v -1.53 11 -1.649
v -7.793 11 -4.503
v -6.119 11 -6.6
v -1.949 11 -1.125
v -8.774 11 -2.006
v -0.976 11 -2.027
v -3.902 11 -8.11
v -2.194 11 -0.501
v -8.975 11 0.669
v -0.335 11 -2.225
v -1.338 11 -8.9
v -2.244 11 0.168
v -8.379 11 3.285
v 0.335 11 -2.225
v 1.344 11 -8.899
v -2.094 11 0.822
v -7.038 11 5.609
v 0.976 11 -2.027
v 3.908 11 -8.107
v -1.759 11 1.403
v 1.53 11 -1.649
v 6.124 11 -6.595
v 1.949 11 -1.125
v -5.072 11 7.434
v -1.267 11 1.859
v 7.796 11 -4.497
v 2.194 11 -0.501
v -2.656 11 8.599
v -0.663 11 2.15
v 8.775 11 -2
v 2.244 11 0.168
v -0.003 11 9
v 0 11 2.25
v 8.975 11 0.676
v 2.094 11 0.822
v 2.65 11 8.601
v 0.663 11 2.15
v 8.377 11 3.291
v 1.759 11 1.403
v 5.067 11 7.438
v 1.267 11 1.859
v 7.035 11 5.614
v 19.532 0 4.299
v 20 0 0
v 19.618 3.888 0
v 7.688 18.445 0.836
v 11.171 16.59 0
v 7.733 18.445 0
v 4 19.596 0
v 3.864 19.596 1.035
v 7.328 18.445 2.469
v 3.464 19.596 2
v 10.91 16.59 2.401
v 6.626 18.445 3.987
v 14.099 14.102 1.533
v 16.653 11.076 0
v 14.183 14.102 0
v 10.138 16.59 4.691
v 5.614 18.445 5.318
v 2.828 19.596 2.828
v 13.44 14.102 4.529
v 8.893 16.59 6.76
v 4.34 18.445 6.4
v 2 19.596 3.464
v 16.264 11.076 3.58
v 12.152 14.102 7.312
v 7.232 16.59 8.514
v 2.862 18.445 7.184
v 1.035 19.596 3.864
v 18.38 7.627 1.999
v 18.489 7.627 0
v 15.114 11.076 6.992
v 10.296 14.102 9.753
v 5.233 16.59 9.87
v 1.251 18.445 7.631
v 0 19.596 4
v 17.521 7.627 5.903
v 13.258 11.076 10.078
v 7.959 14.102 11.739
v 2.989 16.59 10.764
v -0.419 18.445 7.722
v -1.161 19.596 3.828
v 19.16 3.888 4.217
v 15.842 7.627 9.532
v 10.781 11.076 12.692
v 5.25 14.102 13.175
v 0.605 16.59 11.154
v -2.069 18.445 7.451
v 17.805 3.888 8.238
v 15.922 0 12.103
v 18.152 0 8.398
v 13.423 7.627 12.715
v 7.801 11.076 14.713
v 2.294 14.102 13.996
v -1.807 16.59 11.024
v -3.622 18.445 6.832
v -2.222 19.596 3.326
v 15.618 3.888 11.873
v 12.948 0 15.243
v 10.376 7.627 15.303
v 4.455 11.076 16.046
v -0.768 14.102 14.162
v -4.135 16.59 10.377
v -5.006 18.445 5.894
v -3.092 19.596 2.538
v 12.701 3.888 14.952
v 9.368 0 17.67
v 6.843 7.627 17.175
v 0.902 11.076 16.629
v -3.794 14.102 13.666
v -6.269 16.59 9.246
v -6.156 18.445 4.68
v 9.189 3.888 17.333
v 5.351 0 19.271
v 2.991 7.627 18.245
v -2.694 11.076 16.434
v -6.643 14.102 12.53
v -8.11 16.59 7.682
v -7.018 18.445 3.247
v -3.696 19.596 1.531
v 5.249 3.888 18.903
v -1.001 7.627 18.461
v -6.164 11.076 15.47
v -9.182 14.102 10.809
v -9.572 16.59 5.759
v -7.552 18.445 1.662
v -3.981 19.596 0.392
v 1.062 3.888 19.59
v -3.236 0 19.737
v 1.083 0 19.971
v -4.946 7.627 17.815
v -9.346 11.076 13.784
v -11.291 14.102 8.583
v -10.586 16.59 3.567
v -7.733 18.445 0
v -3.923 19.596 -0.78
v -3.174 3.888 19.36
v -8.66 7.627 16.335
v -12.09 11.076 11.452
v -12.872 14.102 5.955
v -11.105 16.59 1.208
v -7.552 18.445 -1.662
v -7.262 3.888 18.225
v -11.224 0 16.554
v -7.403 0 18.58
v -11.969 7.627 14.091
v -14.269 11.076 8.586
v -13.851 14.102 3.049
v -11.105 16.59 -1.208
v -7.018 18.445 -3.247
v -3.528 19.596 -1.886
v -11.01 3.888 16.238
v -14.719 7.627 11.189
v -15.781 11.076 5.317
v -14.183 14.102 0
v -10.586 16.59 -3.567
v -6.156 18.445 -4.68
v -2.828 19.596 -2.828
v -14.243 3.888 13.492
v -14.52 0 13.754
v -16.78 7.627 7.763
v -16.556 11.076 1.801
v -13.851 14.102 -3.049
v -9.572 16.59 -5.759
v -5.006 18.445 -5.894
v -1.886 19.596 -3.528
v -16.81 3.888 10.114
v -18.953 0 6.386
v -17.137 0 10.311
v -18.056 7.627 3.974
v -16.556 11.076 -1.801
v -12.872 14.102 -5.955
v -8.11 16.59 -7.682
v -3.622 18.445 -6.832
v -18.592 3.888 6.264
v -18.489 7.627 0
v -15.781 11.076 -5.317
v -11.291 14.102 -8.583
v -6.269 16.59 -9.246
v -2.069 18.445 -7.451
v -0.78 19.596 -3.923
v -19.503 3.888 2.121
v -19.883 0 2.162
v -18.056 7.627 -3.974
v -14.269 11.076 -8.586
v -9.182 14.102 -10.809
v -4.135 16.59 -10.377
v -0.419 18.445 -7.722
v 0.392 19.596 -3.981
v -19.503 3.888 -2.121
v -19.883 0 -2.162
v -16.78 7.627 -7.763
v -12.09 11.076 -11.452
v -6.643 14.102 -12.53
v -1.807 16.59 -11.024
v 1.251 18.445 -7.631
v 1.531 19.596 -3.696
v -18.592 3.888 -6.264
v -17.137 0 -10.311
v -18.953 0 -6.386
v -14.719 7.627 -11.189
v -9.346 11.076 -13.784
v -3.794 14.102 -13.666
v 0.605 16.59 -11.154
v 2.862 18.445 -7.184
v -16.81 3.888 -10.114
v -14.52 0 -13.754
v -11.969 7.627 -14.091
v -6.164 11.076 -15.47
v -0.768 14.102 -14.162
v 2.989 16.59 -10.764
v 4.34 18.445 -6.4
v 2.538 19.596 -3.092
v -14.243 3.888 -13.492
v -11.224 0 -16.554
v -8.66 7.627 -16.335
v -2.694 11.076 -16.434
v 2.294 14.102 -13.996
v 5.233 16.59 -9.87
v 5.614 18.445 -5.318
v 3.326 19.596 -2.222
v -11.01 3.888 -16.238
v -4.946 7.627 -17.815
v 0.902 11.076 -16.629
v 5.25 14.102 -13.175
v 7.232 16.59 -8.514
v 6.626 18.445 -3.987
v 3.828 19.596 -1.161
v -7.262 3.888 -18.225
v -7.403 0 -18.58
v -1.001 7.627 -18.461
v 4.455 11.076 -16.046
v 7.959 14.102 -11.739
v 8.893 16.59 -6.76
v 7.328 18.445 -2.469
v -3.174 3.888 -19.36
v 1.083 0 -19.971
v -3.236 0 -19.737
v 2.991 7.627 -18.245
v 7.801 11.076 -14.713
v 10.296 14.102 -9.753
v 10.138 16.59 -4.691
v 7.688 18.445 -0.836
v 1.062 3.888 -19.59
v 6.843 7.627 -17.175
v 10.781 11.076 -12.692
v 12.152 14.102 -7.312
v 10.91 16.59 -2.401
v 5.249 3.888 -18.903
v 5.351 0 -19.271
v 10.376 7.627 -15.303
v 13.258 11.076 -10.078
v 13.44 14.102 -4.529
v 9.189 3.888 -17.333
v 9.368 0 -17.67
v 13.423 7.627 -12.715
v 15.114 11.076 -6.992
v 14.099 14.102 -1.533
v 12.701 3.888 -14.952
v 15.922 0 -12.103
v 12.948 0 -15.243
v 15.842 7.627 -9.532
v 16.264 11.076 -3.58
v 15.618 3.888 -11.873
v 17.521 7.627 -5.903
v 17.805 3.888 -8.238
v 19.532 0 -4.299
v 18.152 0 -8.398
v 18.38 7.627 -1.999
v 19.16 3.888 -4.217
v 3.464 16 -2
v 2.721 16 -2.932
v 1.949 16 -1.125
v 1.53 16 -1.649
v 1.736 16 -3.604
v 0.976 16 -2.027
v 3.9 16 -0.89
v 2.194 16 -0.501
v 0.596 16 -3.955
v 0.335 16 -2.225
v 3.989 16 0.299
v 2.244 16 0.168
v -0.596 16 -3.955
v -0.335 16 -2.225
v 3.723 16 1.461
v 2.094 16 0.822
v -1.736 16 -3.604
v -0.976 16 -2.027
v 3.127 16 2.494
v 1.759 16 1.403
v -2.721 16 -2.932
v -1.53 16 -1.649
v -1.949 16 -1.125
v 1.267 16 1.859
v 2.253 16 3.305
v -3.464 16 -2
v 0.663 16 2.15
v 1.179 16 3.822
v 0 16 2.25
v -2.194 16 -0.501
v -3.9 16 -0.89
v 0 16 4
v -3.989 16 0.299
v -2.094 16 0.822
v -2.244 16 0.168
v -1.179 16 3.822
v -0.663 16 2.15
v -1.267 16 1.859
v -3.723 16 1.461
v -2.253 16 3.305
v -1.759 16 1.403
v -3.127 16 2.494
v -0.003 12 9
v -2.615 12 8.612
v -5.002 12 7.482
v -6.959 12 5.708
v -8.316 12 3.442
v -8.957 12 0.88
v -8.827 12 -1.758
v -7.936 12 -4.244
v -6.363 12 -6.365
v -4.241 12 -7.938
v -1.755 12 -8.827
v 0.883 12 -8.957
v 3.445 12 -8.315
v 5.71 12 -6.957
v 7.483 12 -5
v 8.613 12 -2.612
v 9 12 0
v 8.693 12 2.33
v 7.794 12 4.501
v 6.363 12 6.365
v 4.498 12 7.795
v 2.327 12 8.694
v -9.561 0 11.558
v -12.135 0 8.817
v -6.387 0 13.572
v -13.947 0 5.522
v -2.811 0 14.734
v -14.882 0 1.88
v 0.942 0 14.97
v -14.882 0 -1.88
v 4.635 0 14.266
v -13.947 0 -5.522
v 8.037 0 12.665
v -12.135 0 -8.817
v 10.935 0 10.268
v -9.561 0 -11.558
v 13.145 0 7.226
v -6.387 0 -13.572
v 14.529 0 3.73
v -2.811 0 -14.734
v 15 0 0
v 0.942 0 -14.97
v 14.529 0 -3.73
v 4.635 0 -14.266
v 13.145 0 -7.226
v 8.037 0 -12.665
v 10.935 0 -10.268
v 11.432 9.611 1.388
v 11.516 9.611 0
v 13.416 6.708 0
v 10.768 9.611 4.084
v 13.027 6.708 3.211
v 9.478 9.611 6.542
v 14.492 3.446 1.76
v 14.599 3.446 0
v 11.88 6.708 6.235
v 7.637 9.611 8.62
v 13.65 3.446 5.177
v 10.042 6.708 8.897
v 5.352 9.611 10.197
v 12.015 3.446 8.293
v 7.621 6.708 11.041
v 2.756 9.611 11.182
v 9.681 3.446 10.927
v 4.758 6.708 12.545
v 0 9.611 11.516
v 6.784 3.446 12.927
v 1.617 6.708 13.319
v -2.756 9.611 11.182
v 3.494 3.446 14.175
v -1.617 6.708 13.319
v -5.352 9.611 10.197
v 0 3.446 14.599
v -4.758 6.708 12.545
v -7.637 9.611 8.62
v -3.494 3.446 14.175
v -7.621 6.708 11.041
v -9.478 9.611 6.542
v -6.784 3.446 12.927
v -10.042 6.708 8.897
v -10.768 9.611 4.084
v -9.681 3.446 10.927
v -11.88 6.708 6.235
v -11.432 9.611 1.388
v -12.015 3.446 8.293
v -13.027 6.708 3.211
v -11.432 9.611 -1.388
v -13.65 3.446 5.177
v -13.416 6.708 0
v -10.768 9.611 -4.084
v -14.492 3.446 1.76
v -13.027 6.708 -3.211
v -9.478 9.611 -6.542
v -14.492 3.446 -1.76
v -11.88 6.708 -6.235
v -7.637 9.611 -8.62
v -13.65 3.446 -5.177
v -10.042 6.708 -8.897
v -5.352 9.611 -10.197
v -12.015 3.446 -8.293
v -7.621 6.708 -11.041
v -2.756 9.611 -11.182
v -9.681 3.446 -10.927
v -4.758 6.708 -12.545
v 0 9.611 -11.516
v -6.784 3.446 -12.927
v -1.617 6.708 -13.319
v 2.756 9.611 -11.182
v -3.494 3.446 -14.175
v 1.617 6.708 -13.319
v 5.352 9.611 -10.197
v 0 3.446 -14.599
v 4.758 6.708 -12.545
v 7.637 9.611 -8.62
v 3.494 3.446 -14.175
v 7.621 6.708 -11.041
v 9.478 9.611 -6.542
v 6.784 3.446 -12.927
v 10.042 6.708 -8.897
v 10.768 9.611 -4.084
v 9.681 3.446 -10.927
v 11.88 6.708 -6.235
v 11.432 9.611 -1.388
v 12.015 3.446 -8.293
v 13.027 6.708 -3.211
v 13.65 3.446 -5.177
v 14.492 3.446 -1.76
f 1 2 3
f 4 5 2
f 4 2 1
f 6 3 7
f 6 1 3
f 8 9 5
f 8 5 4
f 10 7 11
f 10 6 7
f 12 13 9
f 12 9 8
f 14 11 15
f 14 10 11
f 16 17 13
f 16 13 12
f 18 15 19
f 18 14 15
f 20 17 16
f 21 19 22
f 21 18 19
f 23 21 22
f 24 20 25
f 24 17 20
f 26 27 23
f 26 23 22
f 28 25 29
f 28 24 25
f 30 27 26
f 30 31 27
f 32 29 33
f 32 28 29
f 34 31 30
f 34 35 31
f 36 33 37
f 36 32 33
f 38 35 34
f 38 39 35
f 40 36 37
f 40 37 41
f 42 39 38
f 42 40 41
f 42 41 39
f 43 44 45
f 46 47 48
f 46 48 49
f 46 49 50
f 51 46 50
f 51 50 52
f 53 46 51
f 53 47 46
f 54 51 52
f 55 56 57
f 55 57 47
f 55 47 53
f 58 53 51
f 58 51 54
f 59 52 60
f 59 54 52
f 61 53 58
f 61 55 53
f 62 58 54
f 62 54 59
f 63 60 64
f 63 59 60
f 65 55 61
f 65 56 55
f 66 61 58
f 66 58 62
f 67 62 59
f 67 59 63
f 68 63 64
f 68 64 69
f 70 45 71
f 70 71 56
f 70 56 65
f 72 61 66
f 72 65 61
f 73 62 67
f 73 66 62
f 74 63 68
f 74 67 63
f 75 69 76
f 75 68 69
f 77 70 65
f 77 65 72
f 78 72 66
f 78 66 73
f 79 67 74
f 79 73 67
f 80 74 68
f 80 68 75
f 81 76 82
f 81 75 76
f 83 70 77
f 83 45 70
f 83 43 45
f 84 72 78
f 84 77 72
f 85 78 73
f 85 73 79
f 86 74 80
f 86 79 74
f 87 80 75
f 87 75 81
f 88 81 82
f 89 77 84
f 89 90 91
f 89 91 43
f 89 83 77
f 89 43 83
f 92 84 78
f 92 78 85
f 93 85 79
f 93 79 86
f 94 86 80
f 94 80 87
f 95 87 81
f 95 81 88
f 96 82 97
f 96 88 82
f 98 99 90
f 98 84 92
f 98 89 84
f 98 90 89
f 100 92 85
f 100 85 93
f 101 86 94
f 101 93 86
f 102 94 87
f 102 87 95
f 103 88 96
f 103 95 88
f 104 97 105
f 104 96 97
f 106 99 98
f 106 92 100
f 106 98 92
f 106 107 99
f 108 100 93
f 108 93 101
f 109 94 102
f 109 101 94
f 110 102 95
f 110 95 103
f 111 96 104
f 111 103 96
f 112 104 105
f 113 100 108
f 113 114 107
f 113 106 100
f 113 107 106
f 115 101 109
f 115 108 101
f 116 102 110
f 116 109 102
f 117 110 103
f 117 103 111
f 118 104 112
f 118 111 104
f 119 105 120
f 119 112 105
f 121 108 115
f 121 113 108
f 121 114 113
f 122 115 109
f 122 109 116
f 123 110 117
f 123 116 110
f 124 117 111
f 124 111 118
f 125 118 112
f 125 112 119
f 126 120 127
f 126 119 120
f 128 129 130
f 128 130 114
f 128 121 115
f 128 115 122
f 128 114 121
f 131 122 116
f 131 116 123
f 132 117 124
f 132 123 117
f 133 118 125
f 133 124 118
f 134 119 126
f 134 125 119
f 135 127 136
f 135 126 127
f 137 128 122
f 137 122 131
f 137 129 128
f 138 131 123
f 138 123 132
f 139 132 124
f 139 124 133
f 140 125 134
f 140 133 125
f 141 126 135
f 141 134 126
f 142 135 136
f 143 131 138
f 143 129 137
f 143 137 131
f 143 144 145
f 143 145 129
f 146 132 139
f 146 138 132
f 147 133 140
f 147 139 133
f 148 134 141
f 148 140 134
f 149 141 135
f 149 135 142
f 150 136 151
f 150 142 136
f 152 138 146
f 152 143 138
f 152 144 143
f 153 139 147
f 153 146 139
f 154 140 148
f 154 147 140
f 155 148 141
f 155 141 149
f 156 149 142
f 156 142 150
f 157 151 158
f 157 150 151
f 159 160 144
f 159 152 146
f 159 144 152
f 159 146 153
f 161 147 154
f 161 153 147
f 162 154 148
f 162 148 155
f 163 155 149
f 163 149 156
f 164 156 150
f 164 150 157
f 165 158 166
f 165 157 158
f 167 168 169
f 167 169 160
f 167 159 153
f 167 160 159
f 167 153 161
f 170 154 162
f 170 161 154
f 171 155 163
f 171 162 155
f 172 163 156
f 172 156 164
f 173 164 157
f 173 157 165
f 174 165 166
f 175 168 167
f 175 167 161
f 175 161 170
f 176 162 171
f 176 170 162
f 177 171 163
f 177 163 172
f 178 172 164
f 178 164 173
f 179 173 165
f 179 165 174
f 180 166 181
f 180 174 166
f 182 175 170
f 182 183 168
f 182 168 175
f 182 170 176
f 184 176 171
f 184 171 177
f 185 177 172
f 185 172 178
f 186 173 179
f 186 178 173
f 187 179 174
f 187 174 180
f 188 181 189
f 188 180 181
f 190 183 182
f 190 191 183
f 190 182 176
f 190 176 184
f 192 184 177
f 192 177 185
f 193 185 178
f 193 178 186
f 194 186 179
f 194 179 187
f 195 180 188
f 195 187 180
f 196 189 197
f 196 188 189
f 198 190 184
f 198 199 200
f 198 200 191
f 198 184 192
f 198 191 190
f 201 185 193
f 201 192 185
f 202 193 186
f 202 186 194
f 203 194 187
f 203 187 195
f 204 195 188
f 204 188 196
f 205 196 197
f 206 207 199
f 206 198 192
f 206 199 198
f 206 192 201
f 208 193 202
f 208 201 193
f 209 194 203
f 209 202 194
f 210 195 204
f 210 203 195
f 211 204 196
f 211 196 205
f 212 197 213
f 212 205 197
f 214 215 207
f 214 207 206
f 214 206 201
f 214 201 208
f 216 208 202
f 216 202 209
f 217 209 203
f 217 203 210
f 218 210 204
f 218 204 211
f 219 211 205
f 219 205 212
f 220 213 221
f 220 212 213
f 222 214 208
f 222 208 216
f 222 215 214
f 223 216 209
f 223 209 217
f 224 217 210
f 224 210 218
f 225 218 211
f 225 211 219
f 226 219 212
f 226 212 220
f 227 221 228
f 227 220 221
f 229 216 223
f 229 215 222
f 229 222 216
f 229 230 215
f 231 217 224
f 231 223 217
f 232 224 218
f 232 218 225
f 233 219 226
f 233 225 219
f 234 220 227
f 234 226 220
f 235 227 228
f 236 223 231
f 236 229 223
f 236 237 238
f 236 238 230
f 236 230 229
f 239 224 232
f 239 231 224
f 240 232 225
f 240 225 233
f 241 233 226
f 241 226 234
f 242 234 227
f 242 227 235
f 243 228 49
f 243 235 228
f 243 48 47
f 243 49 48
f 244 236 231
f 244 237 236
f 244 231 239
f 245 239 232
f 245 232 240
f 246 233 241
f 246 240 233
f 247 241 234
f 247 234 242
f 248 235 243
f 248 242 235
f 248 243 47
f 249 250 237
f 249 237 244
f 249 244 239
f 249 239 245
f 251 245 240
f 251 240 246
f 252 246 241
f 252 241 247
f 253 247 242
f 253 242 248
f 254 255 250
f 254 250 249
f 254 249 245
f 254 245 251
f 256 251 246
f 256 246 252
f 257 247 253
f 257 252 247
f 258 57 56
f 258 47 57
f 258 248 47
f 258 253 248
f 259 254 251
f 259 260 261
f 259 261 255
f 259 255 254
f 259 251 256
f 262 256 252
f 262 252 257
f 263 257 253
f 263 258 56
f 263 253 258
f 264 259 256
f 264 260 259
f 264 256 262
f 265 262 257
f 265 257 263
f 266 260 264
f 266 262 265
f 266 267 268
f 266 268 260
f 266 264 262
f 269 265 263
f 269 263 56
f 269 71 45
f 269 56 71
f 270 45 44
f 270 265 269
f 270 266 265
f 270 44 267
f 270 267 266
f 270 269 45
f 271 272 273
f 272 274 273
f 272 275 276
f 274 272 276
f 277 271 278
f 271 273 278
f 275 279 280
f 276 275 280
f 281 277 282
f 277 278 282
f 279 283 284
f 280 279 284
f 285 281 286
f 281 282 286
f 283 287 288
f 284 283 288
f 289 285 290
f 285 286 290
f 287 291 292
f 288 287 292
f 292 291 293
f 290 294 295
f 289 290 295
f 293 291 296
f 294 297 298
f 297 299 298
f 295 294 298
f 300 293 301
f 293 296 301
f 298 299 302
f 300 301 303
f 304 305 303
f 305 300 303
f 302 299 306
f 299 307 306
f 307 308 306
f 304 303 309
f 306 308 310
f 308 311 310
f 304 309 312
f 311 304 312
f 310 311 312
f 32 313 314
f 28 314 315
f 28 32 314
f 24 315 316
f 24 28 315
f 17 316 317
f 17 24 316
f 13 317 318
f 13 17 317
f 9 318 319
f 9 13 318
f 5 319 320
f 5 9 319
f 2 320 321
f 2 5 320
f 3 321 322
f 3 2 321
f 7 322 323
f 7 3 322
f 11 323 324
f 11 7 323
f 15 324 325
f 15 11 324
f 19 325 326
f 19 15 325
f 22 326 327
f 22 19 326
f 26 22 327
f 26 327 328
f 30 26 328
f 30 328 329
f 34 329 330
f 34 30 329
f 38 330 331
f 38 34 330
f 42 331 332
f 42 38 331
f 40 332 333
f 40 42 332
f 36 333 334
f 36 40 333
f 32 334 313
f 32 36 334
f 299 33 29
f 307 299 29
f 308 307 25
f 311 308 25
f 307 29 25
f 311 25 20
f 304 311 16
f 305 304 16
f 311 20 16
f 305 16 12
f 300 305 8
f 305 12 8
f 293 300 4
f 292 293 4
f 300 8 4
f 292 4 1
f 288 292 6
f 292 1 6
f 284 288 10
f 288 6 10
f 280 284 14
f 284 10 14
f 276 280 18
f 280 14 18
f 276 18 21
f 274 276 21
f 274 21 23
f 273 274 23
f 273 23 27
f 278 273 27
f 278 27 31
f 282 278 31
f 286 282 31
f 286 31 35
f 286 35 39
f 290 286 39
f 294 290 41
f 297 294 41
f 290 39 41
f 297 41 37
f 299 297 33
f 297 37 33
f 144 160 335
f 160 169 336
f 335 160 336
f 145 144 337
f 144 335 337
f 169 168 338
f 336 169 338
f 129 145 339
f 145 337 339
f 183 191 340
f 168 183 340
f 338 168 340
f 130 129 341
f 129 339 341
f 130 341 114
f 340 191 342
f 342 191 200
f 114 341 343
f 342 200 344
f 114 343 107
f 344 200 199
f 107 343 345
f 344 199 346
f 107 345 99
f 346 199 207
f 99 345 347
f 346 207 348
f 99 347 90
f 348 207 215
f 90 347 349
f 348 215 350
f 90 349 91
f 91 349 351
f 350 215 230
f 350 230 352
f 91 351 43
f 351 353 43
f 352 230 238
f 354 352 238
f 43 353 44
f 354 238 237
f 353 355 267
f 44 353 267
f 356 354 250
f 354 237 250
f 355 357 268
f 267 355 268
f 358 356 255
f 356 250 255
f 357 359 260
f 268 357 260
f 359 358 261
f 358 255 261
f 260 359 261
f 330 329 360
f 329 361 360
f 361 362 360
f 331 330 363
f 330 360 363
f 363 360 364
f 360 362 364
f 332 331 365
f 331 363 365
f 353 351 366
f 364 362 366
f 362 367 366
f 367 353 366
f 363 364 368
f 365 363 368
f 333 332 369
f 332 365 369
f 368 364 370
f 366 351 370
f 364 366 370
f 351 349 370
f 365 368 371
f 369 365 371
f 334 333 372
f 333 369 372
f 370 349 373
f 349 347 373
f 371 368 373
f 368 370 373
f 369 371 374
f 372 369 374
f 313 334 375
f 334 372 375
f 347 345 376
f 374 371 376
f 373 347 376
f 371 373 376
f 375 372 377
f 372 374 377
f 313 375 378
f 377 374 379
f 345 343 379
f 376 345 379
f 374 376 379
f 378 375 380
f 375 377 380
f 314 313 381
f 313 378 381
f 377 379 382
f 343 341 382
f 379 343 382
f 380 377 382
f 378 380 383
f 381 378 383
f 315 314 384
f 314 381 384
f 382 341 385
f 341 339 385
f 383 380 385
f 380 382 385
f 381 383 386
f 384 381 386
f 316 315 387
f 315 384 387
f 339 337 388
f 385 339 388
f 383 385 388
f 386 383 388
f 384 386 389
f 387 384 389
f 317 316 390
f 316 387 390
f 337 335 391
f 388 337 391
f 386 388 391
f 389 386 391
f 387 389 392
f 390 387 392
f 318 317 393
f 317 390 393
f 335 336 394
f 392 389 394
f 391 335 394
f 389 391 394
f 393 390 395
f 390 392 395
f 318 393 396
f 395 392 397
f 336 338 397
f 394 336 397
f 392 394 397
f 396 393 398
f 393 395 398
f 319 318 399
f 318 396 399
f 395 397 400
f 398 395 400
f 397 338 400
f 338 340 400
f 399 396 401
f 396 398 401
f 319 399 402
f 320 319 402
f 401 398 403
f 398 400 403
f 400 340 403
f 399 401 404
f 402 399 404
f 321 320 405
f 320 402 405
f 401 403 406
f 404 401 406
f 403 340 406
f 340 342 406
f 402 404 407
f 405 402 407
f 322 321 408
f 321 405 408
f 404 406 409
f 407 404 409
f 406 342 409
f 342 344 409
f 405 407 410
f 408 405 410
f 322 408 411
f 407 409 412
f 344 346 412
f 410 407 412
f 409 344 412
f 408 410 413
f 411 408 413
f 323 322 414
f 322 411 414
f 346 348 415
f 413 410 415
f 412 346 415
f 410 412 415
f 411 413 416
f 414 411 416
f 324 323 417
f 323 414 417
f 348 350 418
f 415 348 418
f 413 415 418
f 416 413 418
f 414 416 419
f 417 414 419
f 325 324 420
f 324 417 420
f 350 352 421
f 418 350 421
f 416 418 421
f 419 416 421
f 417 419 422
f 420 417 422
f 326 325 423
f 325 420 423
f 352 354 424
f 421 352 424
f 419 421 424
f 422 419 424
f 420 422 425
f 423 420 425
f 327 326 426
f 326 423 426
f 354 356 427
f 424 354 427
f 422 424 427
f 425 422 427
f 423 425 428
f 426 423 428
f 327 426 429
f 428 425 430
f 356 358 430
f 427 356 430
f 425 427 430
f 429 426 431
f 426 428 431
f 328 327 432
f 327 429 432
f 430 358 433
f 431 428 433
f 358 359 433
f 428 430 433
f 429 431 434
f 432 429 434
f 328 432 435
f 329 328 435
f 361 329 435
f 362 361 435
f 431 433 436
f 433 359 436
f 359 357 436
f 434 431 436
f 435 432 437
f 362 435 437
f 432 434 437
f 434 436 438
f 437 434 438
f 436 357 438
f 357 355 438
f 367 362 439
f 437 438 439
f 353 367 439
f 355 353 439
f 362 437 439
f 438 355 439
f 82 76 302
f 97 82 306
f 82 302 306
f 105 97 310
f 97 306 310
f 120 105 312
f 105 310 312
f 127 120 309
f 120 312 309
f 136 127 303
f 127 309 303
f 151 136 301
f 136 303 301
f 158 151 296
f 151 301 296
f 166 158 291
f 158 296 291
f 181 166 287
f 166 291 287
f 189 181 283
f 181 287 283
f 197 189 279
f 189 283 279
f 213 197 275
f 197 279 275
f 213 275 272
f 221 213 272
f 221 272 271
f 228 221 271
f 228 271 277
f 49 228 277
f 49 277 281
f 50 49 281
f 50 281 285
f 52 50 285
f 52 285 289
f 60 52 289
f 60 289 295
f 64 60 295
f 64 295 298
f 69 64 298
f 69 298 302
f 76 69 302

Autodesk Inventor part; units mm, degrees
ref_plane "YZ Plane" through (0, 0, 0) normal (1, 0, 0) x (0, 1, 0)
ref_plane "XY Plane" through (0, 0, 0) normal (0, 0, 1) x (1, 0, 0)
sketch "Sketch1" plane through (0, 0, 0) normal (0, 0, 1) x (1, 0, 0)
  line L0 (0, 0) -> (0, 20)
  line L1 (0, 0) -> (20, 0)
  arc A0 (20, 0) -> (0, 20) centre (0, 0) ccw
  line L2 (0, -4.828427) -> (0, 28.970563)
  dimension "d2" = 20
sketch "Sketch1 outline for Revolution1" plane through (0, 0, 0) normal (0, 0, 1) x (1, 0, 0)
  line L0 (0, 0) -> (0, 20)
  arc A0 (0, 20) -> (20, 0) centre (0, 0) cw
  line L1 (20, 0) -> (0, 0)
revolve "Revolution1" add sketch "Sketch1 outline for Revolution1" angle 360 about axis through (0, -10, 0) along (0, 1, 0)
ref_plane "Work Plane1" through (0, 20, 0) normal (0, 1, 0) x (-1, 0, 0)
sketch "Sketch2" plane through (0, 20, 0) normal (0, 1, 0) x (-1, 0, 0)
  point P0 (0, 0)
  point P1 (0, 0)
hole "Hole1" at (0, 20, 0) direction (0, -1, 0) diameter 4.5 end through all counterbore diameter 8 counterbore depth 4 clearance for "Socket Head Cap Screw" size "M4" standard "Ansi Metric M Profile"
shell "Shell1" thickness 5 removed faces 1 at (13.884144, 0, 1.68584)
sketch "Sketch3" plane through (0, 0, 0) normal (0, -1, 0) x (1, 0, 0)
  circle A0 centre (0, 0) radius 7.25 projected
  circle A1 centre (0, 0) radius 2.25 projected
sketch "Sketch3 outline for Extrusion1" plane through (0, 0, 0) normal (0, -1, 0) x (1, 0, 0)
  circle A0 centre (0, 0) radius 7.25
  circle A1 centre (0, 0) radius 2.25
extrude "Extrusion1" cut sketch "Sketch3 outline for Extrusion1" against normal up to surface (11 mm away)
properties part number "Ball_Upper Half" material "Nylon 6/6"
